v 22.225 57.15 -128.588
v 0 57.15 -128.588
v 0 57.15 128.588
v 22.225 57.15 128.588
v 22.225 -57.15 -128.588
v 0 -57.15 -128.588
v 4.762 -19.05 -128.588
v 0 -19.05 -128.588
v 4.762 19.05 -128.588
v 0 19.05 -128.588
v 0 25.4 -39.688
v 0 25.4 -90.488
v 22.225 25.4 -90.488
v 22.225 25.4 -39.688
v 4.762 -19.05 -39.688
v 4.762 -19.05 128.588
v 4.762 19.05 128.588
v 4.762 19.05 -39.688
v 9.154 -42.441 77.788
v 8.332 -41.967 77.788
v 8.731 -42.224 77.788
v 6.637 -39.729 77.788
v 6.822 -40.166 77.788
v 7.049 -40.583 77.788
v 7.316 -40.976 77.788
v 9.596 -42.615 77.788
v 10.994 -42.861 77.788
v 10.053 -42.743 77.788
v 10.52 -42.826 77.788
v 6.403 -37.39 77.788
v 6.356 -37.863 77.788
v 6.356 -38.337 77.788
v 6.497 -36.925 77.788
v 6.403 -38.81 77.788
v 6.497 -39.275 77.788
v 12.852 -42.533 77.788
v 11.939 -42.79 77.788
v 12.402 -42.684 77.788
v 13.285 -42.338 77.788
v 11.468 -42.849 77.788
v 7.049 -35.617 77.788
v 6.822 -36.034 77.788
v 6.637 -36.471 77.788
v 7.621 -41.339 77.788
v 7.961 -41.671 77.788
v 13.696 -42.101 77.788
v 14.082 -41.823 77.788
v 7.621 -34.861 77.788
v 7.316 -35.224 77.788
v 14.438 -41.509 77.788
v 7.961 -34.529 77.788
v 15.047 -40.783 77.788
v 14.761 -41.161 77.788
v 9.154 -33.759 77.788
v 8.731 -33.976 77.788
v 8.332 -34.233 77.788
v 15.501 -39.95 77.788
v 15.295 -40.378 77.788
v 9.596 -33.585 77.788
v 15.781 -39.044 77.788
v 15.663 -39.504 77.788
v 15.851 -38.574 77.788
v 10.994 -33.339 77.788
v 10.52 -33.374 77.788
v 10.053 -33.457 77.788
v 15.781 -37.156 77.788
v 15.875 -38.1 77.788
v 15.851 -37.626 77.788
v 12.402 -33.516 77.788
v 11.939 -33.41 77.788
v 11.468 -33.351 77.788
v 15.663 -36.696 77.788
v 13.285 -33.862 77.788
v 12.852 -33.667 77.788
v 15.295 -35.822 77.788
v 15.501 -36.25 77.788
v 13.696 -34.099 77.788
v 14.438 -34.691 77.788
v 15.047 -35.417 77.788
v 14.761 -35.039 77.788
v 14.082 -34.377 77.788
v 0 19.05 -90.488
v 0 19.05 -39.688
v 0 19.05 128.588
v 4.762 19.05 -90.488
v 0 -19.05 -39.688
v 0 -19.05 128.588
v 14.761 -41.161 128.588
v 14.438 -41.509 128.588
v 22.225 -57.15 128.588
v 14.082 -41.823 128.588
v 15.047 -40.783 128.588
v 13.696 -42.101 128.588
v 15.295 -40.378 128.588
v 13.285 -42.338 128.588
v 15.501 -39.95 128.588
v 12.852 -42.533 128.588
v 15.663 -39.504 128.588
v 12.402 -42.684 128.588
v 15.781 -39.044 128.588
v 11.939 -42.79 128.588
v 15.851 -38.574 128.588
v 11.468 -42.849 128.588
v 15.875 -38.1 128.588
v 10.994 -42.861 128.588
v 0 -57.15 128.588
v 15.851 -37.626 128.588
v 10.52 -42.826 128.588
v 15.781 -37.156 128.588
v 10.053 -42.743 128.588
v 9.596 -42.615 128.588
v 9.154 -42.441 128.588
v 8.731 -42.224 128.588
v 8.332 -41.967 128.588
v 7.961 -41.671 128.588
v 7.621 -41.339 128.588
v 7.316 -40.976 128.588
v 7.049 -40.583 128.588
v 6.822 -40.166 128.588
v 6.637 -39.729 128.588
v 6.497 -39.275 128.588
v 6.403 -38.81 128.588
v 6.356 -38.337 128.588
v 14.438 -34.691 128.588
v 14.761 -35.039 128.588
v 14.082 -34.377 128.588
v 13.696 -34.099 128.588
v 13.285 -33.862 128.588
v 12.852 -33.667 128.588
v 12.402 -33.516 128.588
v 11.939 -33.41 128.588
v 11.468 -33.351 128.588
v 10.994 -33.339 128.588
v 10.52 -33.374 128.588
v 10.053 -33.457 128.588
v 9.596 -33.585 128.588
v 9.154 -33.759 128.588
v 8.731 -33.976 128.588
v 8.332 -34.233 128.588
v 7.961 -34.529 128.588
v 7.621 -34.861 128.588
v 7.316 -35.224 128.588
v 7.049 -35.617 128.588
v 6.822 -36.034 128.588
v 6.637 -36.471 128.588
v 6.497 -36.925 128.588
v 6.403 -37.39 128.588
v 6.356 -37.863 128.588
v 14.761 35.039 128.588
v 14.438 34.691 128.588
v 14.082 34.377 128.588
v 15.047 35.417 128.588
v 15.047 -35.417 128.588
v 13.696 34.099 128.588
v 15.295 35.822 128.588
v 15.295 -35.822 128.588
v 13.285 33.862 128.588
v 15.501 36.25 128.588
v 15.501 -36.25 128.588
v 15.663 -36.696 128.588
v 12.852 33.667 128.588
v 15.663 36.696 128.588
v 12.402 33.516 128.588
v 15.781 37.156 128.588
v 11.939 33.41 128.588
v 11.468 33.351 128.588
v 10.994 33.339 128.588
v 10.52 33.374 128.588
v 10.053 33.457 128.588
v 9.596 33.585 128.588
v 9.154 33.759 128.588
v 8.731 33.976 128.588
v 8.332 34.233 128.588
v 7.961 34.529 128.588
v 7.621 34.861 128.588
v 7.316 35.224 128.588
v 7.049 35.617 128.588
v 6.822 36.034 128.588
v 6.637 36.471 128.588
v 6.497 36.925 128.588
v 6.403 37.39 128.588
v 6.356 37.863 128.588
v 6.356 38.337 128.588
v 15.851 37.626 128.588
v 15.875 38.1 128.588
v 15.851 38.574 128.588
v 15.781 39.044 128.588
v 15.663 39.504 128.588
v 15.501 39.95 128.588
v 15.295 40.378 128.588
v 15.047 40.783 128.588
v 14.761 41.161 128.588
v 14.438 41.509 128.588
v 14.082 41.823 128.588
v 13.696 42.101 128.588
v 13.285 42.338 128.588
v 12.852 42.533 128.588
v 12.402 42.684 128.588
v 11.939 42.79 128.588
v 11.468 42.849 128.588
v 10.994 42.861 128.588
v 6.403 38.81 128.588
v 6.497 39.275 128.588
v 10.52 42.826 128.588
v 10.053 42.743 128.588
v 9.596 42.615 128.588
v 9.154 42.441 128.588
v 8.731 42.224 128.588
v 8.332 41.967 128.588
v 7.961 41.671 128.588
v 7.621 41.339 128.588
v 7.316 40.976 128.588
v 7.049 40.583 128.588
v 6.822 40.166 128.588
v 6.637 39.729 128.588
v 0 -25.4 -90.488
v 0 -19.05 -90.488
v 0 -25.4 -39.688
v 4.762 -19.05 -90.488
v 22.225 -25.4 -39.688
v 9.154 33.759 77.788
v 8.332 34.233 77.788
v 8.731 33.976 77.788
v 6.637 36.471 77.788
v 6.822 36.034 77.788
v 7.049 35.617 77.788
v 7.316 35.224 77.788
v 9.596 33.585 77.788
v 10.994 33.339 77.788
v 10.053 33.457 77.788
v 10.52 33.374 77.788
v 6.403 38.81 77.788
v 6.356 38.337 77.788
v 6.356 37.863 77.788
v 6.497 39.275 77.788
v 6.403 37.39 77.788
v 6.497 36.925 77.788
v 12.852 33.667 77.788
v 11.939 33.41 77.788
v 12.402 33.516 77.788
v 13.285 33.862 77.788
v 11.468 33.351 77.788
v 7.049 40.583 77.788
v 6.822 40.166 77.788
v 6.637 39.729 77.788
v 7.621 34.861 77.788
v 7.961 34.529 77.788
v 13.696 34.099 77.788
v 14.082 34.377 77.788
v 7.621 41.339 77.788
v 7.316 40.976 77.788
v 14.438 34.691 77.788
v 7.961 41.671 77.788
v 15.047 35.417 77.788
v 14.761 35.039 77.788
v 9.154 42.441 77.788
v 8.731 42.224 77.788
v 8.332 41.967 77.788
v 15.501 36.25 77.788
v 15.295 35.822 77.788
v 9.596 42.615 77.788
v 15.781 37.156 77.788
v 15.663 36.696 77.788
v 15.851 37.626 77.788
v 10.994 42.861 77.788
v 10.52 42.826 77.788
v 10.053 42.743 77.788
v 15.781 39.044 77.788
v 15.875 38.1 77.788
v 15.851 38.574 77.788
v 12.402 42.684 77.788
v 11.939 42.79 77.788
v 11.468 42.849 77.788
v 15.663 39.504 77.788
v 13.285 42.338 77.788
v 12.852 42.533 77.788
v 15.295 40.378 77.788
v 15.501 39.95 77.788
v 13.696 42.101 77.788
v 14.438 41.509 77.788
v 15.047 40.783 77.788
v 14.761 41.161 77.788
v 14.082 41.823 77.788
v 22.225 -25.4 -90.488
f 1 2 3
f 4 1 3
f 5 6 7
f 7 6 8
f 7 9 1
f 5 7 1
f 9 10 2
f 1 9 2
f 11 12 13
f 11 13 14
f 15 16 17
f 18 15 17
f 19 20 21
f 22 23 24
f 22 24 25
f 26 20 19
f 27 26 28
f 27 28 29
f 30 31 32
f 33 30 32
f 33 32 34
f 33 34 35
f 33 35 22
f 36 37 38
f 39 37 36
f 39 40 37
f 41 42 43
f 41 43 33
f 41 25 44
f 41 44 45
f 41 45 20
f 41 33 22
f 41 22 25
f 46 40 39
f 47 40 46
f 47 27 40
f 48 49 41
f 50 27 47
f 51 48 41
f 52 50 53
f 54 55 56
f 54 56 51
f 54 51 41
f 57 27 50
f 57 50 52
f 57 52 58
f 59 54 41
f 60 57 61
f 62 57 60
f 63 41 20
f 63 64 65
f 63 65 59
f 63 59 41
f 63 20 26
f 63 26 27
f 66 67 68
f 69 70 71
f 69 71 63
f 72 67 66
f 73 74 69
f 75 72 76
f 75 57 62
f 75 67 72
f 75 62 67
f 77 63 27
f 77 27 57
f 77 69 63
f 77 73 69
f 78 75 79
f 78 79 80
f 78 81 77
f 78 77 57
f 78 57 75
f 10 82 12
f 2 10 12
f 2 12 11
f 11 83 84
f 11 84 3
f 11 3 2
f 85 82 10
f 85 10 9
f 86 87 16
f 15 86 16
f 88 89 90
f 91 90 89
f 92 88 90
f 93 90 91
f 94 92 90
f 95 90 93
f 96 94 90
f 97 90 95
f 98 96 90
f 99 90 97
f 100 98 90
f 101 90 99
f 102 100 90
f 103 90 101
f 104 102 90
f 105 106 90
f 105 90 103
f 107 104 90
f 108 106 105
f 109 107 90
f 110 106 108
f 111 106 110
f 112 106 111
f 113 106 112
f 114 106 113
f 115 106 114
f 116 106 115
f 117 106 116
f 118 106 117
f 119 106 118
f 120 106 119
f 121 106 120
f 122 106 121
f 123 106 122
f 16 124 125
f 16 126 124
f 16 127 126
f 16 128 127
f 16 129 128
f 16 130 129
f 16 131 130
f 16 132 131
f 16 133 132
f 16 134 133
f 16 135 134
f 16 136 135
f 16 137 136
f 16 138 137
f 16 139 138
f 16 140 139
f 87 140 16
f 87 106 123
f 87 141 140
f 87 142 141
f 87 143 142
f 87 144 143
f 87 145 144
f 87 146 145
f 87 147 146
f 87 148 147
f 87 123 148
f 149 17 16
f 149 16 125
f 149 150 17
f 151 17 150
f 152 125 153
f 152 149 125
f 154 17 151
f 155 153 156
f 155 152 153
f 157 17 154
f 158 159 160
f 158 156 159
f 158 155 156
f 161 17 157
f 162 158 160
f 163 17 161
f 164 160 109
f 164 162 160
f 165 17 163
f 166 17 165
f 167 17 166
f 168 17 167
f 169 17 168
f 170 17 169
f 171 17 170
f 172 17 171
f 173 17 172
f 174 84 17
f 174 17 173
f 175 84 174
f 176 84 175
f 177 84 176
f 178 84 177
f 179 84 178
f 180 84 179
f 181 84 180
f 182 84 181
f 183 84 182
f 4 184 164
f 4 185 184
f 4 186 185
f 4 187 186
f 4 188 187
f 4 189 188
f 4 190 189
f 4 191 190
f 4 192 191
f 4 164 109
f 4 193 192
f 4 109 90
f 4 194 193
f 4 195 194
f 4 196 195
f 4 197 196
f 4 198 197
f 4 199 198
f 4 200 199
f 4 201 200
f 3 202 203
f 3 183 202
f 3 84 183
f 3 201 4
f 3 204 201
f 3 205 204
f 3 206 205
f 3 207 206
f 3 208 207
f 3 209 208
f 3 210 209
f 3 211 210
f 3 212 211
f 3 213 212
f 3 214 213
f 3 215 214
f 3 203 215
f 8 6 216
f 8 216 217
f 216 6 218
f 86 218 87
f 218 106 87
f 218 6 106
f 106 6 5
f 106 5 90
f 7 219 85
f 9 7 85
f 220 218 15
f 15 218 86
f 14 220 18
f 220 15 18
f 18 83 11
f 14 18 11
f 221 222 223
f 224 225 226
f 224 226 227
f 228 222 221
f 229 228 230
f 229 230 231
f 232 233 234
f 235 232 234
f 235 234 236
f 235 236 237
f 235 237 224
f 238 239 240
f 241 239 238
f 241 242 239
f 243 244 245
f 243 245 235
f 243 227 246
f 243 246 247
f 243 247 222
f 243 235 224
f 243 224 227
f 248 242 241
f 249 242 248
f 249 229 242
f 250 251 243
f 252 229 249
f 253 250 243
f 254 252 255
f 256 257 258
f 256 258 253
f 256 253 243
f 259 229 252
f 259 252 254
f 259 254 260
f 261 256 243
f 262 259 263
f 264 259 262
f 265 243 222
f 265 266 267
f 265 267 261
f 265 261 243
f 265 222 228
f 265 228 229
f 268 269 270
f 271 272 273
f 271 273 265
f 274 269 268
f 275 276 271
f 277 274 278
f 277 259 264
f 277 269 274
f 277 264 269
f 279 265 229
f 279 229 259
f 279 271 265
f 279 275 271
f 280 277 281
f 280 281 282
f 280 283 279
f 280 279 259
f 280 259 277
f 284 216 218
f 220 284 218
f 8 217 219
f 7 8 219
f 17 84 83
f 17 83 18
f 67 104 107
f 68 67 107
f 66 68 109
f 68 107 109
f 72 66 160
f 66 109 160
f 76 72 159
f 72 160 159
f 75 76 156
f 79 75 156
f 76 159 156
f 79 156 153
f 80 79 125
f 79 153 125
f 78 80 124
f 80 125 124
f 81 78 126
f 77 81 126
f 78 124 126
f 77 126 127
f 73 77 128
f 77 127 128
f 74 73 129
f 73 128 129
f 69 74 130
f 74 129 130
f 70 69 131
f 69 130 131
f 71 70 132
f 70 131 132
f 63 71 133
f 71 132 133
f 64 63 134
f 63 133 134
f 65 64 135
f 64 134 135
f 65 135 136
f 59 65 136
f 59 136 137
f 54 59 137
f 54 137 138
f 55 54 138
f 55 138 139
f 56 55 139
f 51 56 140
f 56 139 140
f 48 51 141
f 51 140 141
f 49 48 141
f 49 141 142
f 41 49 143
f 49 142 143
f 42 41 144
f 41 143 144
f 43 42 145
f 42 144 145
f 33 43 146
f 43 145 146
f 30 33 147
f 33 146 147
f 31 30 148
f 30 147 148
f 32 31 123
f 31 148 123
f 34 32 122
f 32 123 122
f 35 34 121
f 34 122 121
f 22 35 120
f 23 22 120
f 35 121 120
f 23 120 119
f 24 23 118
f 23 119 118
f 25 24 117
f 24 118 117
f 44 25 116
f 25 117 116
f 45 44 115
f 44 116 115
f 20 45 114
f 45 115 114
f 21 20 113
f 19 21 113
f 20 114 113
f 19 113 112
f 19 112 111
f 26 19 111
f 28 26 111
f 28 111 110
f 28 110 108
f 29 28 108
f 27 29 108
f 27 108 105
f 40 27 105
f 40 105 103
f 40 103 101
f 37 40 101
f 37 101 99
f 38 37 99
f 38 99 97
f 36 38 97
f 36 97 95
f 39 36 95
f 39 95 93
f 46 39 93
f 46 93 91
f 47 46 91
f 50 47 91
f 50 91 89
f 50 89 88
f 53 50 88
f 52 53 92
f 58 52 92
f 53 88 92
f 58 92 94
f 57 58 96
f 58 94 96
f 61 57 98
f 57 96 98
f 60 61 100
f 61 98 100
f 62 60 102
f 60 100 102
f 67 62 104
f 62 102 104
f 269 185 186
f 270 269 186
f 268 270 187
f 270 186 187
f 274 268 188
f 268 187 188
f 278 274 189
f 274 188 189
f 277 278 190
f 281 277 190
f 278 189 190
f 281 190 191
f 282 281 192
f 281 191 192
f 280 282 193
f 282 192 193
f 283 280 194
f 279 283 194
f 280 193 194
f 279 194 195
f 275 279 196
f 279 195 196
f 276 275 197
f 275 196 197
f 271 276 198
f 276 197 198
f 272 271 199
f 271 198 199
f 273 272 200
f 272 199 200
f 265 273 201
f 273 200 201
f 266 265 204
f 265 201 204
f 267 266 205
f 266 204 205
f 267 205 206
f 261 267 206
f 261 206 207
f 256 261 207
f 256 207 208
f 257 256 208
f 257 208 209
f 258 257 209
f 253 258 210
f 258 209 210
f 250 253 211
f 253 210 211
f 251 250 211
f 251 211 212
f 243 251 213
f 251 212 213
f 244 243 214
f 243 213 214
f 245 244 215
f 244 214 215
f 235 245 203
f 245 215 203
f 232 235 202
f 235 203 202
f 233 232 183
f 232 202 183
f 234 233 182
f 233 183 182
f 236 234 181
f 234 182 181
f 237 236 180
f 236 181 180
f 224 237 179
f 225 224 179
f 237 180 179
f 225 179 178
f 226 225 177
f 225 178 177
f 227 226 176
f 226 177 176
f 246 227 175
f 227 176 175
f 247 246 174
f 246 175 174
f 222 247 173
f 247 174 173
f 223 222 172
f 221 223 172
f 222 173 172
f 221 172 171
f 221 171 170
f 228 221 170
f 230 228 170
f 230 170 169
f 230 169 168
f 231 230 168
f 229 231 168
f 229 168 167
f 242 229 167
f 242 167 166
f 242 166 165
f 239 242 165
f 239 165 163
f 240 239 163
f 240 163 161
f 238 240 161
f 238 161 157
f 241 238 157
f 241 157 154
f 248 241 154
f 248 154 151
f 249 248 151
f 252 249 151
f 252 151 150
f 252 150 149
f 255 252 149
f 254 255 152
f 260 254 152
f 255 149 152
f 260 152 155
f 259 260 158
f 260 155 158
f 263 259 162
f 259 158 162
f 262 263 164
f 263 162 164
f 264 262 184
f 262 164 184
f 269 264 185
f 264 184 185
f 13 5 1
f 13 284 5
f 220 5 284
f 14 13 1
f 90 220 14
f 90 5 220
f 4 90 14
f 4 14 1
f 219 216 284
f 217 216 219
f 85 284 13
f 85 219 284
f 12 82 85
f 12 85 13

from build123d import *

# Parameters (mm, degrees)
F0_W     = 114.3
F0_H     = 257.175
F0_W_2   = 50.8
F0_H_2   = 50.8
F1_DEPTH = 22.225
F2_W     = 4.7625
F2_H     = 38.1
F3_DEPTH = 257.176
F4_R     = 4.7625
F5_DEPTH = 50.8


with BuildPart() as f1:
    # F0 (on Right) → F1 (new body)
    with BuildSketch(Plane.YZ):
        Rectangle(F0_W, F0_H)
        with Locations((0, -65.0875)):
            Rectangle(F0_W_2, F0_H_2, mode=Mode.SUBTRACT)
    extrude(amount=F1_DEPTH)

    # F2 (on face) → F3 (cut, through all)
    with BuildSketch(Plane.XY.offset(128.5875)):
        with Locations((2.38125, 0)):
            Rectangle(F2_W, F2_H)
    extrude(amount=-F3_DEPTH, mode=Mode.SUBTRACT)

    # F4 (on face) → F5 (cut)
    with BuildSketch(Plane.XY.offset(128.5875)):
        with Locations((11.1125, -38.1)):
            Circle(F4_R)
        with Locations((11.1125, 38.1)):
            Circle(F4_R)
    extrude(amount=-F5_DEPTH, mode=Mode.SUBTRACT)


solid = f1.part
